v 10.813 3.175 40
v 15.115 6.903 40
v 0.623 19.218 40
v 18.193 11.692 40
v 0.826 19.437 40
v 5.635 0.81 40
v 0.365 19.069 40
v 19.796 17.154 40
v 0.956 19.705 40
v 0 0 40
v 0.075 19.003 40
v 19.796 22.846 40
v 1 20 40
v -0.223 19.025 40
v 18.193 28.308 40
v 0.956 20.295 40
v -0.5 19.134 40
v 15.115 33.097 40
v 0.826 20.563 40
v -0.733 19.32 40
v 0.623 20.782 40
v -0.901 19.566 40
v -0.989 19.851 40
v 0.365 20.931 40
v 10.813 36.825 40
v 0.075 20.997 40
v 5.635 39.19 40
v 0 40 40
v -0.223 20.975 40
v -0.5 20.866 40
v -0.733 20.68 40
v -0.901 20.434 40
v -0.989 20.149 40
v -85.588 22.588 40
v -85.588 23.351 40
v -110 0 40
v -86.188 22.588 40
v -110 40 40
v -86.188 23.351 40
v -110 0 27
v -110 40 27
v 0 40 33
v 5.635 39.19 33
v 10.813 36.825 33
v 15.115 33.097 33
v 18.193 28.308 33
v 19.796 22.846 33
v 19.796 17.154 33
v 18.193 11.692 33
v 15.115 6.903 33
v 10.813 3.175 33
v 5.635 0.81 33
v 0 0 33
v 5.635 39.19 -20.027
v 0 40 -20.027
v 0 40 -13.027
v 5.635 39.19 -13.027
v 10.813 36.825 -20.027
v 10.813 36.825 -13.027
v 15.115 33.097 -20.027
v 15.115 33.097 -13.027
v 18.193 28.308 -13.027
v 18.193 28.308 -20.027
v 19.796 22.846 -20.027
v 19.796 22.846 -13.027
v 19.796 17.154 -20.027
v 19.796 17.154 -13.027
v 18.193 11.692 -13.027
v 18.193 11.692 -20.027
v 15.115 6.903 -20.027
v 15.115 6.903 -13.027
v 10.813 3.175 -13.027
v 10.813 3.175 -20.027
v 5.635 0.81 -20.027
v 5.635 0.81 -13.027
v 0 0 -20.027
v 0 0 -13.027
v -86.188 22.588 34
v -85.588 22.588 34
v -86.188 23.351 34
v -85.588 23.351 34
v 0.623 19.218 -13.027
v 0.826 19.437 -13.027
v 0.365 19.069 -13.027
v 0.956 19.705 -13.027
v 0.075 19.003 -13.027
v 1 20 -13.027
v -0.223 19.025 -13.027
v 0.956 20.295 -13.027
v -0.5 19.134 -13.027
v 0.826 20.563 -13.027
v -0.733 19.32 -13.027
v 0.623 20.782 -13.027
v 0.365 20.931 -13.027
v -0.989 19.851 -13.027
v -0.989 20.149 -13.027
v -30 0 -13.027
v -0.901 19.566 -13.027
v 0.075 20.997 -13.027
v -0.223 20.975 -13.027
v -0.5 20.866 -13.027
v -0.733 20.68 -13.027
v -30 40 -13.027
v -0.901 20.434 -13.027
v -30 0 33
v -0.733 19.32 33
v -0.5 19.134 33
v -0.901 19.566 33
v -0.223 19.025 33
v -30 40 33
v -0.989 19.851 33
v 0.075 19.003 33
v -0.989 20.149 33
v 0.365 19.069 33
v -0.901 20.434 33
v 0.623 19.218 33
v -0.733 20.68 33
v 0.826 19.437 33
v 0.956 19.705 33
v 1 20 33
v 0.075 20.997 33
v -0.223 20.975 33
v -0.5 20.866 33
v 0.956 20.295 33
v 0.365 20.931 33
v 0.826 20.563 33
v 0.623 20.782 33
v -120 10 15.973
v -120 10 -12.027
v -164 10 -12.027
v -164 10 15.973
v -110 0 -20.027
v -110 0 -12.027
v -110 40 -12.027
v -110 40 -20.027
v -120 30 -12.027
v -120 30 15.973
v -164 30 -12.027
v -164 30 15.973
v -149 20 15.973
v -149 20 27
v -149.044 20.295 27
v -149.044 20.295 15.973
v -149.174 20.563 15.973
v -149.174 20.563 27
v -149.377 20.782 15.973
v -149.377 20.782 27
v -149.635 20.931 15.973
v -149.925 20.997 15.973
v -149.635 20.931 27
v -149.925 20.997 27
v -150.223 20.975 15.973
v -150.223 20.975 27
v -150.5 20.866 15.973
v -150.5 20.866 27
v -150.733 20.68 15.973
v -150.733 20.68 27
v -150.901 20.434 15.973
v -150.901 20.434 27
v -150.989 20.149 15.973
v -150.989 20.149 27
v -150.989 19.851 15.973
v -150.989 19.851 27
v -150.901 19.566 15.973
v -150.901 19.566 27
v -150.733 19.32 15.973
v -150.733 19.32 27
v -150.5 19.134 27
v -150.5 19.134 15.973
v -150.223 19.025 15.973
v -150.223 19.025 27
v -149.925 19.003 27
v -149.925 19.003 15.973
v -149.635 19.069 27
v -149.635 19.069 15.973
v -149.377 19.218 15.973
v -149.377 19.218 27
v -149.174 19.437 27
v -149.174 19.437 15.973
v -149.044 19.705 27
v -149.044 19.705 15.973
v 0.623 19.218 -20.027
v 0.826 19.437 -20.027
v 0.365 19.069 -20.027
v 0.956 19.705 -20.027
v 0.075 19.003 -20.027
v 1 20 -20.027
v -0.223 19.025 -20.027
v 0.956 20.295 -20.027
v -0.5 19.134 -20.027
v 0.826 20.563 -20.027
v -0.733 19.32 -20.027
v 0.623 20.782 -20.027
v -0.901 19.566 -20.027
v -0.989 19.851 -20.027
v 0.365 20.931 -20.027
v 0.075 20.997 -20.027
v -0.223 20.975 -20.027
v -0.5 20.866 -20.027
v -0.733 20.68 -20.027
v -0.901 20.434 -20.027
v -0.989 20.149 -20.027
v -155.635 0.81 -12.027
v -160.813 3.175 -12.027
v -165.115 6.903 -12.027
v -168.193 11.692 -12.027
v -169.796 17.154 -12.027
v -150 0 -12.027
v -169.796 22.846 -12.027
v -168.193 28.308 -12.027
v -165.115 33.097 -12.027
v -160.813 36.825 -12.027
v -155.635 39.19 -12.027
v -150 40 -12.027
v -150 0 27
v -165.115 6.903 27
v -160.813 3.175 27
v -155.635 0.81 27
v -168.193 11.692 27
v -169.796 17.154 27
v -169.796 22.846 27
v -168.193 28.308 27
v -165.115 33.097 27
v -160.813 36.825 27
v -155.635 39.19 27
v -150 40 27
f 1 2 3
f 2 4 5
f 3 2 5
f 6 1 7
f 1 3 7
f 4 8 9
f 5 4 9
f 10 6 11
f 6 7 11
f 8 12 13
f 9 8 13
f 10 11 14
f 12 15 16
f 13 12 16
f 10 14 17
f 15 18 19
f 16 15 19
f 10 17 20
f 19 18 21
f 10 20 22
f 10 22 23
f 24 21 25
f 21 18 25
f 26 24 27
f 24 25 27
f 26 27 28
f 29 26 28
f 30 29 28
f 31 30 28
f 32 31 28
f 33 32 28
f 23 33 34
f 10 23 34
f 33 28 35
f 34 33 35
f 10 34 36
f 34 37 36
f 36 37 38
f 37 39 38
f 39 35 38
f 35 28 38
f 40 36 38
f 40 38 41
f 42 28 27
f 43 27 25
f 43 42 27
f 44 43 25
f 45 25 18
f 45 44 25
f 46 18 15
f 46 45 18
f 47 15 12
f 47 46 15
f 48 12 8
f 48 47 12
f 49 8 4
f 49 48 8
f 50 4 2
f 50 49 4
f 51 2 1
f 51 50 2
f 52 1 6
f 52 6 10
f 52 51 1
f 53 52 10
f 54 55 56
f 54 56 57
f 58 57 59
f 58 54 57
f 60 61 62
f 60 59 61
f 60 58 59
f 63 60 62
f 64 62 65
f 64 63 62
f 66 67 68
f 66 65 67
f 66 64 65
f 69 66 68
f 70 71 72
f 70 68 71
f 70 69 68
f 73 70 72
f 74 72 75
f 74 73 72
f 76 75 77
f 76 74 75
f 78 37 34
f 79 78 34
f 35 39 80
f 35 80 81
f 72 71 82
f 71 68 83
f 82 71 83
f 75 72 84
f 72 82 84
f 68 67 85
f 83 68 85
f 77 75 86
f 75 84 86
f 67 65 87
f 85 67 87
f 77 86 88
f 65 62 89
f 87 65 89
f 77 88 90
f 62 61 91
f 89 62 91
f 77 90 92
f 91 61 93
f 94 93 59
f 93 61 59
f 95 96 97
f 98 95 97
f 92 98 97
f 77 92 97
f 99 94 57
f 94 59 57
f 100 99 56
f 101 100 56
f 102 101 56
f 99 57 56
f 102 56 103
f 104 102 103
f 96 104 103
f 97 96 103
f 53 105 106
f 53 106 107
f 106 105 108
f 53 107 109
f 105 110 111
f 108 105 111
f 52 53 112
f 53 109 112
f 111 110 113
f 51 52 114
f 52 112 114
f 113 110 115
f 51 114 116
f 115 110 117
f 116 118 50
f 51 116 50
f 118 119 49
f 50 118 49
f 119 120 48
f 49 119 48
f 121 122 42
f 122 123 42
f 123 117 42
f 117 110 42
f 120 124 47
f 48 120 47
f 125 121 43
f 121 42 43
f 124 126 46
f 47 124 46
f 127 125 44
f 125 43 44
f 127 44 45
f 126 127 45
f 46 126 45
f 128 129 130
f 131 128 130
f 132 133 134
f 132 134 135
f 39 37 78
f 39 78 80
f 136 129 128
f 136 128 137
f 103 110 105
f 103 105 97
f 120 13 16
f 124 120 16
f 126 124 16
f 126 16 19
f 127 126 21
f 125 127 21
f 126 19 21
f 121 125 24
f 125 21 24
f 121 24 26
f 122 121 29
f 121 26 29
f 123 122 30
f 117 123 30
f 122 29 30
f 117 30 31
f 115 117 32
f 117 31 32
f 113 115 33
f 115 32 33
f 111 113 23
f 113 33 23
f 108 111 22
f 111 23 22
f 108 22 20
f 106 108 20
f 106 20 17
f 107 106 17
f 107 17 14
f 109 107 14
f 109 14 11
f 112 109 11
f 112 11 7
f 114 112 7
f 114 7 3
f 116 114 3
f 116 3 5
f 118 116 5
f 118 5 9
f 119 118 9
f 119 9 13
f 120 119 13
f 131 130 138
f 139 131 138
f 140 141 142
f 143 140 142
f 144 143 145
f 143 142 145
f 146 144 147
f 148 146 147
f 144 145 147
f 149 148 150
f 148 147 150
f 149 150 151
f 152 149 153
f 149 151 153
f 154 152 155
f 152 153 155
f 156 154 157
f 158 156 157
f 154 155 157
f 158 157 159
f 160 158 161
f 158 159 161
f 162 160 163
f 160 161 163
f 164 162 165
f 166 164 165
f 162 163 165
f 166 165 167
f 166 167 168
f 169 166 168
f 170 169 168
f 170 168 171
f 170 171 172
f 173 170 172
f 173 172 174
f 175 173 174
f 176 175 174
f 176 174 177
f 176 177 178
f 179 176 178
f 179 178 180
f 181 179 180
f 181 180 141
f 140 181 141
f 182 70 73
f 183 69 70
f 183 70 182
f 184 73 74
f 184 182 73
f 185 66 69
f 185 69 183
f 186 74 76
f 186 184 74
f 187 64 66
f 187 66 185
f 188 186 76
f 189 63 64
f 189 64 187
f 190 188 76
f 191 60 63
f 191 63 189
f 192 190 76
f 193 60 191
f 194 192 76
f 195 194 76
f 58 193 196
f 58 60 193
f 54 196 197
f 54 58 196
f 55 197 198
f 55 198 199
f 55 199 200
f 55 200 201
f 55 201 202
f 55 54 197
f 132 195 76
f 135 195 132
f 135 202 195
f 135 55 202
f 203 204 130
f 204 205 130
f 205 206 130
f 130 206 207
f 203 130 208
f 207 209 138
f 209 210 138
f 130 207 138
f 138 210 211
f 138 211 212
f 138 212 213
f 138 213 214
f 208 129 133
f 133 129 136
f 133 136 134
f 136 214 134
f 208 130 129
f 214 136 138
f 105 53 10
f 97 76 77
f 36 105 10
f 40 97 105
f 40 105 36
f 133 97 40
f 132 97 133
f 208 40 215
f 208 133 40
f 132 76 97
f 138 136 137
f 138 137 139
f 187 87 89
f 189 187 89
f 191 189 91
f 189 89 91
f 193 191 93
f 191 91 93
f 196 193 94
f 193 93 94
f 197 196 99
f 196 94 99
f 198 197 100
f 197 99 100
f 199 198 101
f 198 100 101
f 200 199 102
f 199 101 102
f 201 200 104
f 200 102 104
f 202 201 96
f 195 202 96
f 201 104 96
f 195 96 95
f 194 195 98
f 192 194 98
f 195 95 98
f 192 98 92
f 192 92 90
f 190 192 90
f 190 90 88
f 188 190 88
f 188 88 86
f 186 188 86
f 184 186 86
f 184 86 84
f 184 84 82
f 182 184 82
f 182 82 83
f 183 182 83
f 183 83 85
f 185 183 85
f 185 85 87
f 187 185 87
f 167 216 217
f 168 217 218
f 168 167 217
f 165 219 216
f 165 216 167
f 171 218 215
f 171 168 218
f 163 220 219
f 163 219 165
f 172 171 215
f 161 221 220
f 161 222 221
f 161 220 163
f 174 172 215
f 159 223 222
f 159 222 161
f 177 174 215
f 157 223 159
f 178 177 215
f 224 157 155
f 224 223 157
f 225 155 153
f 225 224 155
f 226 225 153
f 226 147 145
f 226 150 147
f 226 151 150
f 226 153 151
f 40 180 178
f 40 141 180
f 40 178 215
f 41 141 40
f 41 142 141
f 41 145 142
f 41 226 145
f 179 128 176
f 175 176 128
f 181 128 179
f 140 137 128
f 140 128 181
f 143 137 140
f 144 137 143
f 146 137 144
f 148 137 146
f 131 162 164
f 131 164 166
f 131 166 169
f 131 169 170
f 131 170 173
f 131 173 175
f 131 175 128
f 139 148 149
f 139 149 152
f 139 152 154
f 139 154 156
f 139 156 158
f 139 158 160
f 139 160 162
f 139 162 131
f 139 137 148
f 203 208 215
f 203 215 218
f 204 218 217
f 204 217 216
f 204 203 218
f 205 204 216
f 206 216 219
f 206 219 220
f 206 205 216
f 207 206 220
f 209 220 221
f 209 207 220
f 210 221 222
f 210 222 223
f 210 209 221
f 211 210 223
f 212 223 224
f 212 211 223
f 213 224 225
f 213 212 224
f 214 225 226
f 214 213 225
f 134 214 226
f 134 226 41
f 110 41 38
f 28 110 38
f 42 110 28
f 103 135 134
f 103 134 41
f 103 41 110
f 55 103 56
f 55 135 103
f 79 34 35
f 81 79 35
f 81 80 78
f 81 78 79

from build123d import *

# Parameters (mm, degrees)
BOSS_EXTRU_3_DEPTH      = 40
BOSS_EXTRU_3_DEPTH_BACK = 20.027256934
ESQUISSE12_W            = 60
ESQUISSE12_H            = 8
ENL_V_MAT_EXTRU_1_DEPTH = 40
ESQUISSE12_3_W          = 60
ESQUISSE12_3_H          = 13
ENL_V_MAT_EXTRU_2_DEPTH = 40
ESQUISSE20_W            = 0.599721203
ESQUISSE20_H            = 0.763281531
ENL_V_MAT_EXTRU_4_DEPTH = 6
ESQUISSE22_W            = 44
ESQUISSE22_H            = 20
ENL_V_MAT_EXTRU_6_DEPTH = 28
ESQUISSE24_W            = 50
ESQUISSE24_H            = 46.027256934
ENL_V_MAT_EXTRU_7_DEPTH = 153
ESQUISSE25_R            = 1
ENL_V_MAT_EXTRU_8_DEPTH = 153
ESQUISSE26_R            = 1
ENL_V_MAT_EXTRU_9_DEPTH = 72


with BuildPart() as part:
    # Esquisse5 → Boss.-Extru.3 (new, two sides: drawn at the far end of the back side and taken through both)
    with BuildSketch(Plane.XY.offset(-BOSS_EXTRU_3_DEPTH_BACK)):
        with BuildLine():
            Line((0, 0), (-150, 0))
            ThreePointArc((-150, 0), (-170, 20), (-150, 40))
            Line((-150, 40), (0, 40))
            ThreePointArc((0, 40), (20, 20), (0, 0))
        make_face()
    extrude(amount=BOSS_EXTRU_3_DEPTH + BOSS_EXTRU_3_DEPTH_BACK)

    # Esquisse12 → Enlèv. mat.-Extru.1 (cut)
    with BuildSketch(Plane(origin=(0, 40, 0), x_dir=(1, 0, 0), z_dir=(0, 1, 0))):
        with Locations((-140, 16.027256934)):
            Rectangle(ESQUISSE12_W, ESQUISSE12_H)
    extrude(amount=-ENL_V_MAT_EXTRU_1_DEPTH, mode=Mode.SUBTRACT)

    # Esquisse12<3> → Enlèv. mat.-Extru.2 (cut)
    with BuildSketch(Plane(origin=(0, 40, 0), x_dir=(1, 0, 0), z_dir=(0, 1, 0))):
        with Locations((-140, -33.5)):
            Rectangle(ESQUISSE12_3_W, ESQUISSE12_3_H)
    extrude(amount=-ENL_V_MAT_EXTRU_2_DEPTH, mode=Mode.SUBTRACT)

    # Esquisse20 → Enlèv. mat.-Extru.4 (cut)
    with BuildSketch(Plane.XY.offset(40)):
        with Locations((-85.88772133, 22.969257081)):
            Rectangle(ESQUISSE20_W, ESQUISSE20_H)
    extrude(amount=-ENL_V_MAT_EXTRU_4_DEPTH, mode=Mode.SUBTRACT)

    # Esquisse22 → Enlèv. mat.-Extru.6 (cut)
    with BuildSketch(Plane(origin=(0, 0, -12.027256934), x_dir=(-1, 0, 0), z_dir=(0, 0, -1))):
        with Locations((142, 20)):
            Rectangle(ESQUISSE22_W, ESQUISSE22_H)
    extrude(amount=-ENL_V_MAT_EXTRU_6_DEPTH, mode=Mode.SUBTRACT)

    # Esquisse24 → Enlèv. mat.-Extru.7 (cut)
    with BuildSketch(Plane(origin=(0, 40, 0), x_dir=(1, 0, 0), z_dir=(0, 1, 0))):
        with Locations((-5, -9.986371533)):
            Rectangle(ESQUISSE24_W, ESQUISSE24_H)
    extrude(amount=-ENL_V_MAT_EXTRU_7_DEPTH, mode=Mode.SUBTRACT)

    # Esquisse25 → Enlèv. mat.-Extru.8 (cut)
    with BuildSketch(Plane.XY.offset(40)):
        with Locations((0, 20)):
            Circle(ESQUISSE25_R)
    extrude(amount=-ENL_V_MAT_EXTRU_8_DEPTH, mode=Mode.SUBTRACT)

    # Esquisse26 → Enlèv. mat.-Extru.9 (cut)
    with BuildSketch(Plane.XY.offset(27)):
        with Locations((-150, 20)):
            Circle(ESQUISSE26_R)
    extrude(amount=-ENL_V_MAT_EXTRU_9_DEPTH, mode=Mode.SUBTRACT)


solid = part.part
